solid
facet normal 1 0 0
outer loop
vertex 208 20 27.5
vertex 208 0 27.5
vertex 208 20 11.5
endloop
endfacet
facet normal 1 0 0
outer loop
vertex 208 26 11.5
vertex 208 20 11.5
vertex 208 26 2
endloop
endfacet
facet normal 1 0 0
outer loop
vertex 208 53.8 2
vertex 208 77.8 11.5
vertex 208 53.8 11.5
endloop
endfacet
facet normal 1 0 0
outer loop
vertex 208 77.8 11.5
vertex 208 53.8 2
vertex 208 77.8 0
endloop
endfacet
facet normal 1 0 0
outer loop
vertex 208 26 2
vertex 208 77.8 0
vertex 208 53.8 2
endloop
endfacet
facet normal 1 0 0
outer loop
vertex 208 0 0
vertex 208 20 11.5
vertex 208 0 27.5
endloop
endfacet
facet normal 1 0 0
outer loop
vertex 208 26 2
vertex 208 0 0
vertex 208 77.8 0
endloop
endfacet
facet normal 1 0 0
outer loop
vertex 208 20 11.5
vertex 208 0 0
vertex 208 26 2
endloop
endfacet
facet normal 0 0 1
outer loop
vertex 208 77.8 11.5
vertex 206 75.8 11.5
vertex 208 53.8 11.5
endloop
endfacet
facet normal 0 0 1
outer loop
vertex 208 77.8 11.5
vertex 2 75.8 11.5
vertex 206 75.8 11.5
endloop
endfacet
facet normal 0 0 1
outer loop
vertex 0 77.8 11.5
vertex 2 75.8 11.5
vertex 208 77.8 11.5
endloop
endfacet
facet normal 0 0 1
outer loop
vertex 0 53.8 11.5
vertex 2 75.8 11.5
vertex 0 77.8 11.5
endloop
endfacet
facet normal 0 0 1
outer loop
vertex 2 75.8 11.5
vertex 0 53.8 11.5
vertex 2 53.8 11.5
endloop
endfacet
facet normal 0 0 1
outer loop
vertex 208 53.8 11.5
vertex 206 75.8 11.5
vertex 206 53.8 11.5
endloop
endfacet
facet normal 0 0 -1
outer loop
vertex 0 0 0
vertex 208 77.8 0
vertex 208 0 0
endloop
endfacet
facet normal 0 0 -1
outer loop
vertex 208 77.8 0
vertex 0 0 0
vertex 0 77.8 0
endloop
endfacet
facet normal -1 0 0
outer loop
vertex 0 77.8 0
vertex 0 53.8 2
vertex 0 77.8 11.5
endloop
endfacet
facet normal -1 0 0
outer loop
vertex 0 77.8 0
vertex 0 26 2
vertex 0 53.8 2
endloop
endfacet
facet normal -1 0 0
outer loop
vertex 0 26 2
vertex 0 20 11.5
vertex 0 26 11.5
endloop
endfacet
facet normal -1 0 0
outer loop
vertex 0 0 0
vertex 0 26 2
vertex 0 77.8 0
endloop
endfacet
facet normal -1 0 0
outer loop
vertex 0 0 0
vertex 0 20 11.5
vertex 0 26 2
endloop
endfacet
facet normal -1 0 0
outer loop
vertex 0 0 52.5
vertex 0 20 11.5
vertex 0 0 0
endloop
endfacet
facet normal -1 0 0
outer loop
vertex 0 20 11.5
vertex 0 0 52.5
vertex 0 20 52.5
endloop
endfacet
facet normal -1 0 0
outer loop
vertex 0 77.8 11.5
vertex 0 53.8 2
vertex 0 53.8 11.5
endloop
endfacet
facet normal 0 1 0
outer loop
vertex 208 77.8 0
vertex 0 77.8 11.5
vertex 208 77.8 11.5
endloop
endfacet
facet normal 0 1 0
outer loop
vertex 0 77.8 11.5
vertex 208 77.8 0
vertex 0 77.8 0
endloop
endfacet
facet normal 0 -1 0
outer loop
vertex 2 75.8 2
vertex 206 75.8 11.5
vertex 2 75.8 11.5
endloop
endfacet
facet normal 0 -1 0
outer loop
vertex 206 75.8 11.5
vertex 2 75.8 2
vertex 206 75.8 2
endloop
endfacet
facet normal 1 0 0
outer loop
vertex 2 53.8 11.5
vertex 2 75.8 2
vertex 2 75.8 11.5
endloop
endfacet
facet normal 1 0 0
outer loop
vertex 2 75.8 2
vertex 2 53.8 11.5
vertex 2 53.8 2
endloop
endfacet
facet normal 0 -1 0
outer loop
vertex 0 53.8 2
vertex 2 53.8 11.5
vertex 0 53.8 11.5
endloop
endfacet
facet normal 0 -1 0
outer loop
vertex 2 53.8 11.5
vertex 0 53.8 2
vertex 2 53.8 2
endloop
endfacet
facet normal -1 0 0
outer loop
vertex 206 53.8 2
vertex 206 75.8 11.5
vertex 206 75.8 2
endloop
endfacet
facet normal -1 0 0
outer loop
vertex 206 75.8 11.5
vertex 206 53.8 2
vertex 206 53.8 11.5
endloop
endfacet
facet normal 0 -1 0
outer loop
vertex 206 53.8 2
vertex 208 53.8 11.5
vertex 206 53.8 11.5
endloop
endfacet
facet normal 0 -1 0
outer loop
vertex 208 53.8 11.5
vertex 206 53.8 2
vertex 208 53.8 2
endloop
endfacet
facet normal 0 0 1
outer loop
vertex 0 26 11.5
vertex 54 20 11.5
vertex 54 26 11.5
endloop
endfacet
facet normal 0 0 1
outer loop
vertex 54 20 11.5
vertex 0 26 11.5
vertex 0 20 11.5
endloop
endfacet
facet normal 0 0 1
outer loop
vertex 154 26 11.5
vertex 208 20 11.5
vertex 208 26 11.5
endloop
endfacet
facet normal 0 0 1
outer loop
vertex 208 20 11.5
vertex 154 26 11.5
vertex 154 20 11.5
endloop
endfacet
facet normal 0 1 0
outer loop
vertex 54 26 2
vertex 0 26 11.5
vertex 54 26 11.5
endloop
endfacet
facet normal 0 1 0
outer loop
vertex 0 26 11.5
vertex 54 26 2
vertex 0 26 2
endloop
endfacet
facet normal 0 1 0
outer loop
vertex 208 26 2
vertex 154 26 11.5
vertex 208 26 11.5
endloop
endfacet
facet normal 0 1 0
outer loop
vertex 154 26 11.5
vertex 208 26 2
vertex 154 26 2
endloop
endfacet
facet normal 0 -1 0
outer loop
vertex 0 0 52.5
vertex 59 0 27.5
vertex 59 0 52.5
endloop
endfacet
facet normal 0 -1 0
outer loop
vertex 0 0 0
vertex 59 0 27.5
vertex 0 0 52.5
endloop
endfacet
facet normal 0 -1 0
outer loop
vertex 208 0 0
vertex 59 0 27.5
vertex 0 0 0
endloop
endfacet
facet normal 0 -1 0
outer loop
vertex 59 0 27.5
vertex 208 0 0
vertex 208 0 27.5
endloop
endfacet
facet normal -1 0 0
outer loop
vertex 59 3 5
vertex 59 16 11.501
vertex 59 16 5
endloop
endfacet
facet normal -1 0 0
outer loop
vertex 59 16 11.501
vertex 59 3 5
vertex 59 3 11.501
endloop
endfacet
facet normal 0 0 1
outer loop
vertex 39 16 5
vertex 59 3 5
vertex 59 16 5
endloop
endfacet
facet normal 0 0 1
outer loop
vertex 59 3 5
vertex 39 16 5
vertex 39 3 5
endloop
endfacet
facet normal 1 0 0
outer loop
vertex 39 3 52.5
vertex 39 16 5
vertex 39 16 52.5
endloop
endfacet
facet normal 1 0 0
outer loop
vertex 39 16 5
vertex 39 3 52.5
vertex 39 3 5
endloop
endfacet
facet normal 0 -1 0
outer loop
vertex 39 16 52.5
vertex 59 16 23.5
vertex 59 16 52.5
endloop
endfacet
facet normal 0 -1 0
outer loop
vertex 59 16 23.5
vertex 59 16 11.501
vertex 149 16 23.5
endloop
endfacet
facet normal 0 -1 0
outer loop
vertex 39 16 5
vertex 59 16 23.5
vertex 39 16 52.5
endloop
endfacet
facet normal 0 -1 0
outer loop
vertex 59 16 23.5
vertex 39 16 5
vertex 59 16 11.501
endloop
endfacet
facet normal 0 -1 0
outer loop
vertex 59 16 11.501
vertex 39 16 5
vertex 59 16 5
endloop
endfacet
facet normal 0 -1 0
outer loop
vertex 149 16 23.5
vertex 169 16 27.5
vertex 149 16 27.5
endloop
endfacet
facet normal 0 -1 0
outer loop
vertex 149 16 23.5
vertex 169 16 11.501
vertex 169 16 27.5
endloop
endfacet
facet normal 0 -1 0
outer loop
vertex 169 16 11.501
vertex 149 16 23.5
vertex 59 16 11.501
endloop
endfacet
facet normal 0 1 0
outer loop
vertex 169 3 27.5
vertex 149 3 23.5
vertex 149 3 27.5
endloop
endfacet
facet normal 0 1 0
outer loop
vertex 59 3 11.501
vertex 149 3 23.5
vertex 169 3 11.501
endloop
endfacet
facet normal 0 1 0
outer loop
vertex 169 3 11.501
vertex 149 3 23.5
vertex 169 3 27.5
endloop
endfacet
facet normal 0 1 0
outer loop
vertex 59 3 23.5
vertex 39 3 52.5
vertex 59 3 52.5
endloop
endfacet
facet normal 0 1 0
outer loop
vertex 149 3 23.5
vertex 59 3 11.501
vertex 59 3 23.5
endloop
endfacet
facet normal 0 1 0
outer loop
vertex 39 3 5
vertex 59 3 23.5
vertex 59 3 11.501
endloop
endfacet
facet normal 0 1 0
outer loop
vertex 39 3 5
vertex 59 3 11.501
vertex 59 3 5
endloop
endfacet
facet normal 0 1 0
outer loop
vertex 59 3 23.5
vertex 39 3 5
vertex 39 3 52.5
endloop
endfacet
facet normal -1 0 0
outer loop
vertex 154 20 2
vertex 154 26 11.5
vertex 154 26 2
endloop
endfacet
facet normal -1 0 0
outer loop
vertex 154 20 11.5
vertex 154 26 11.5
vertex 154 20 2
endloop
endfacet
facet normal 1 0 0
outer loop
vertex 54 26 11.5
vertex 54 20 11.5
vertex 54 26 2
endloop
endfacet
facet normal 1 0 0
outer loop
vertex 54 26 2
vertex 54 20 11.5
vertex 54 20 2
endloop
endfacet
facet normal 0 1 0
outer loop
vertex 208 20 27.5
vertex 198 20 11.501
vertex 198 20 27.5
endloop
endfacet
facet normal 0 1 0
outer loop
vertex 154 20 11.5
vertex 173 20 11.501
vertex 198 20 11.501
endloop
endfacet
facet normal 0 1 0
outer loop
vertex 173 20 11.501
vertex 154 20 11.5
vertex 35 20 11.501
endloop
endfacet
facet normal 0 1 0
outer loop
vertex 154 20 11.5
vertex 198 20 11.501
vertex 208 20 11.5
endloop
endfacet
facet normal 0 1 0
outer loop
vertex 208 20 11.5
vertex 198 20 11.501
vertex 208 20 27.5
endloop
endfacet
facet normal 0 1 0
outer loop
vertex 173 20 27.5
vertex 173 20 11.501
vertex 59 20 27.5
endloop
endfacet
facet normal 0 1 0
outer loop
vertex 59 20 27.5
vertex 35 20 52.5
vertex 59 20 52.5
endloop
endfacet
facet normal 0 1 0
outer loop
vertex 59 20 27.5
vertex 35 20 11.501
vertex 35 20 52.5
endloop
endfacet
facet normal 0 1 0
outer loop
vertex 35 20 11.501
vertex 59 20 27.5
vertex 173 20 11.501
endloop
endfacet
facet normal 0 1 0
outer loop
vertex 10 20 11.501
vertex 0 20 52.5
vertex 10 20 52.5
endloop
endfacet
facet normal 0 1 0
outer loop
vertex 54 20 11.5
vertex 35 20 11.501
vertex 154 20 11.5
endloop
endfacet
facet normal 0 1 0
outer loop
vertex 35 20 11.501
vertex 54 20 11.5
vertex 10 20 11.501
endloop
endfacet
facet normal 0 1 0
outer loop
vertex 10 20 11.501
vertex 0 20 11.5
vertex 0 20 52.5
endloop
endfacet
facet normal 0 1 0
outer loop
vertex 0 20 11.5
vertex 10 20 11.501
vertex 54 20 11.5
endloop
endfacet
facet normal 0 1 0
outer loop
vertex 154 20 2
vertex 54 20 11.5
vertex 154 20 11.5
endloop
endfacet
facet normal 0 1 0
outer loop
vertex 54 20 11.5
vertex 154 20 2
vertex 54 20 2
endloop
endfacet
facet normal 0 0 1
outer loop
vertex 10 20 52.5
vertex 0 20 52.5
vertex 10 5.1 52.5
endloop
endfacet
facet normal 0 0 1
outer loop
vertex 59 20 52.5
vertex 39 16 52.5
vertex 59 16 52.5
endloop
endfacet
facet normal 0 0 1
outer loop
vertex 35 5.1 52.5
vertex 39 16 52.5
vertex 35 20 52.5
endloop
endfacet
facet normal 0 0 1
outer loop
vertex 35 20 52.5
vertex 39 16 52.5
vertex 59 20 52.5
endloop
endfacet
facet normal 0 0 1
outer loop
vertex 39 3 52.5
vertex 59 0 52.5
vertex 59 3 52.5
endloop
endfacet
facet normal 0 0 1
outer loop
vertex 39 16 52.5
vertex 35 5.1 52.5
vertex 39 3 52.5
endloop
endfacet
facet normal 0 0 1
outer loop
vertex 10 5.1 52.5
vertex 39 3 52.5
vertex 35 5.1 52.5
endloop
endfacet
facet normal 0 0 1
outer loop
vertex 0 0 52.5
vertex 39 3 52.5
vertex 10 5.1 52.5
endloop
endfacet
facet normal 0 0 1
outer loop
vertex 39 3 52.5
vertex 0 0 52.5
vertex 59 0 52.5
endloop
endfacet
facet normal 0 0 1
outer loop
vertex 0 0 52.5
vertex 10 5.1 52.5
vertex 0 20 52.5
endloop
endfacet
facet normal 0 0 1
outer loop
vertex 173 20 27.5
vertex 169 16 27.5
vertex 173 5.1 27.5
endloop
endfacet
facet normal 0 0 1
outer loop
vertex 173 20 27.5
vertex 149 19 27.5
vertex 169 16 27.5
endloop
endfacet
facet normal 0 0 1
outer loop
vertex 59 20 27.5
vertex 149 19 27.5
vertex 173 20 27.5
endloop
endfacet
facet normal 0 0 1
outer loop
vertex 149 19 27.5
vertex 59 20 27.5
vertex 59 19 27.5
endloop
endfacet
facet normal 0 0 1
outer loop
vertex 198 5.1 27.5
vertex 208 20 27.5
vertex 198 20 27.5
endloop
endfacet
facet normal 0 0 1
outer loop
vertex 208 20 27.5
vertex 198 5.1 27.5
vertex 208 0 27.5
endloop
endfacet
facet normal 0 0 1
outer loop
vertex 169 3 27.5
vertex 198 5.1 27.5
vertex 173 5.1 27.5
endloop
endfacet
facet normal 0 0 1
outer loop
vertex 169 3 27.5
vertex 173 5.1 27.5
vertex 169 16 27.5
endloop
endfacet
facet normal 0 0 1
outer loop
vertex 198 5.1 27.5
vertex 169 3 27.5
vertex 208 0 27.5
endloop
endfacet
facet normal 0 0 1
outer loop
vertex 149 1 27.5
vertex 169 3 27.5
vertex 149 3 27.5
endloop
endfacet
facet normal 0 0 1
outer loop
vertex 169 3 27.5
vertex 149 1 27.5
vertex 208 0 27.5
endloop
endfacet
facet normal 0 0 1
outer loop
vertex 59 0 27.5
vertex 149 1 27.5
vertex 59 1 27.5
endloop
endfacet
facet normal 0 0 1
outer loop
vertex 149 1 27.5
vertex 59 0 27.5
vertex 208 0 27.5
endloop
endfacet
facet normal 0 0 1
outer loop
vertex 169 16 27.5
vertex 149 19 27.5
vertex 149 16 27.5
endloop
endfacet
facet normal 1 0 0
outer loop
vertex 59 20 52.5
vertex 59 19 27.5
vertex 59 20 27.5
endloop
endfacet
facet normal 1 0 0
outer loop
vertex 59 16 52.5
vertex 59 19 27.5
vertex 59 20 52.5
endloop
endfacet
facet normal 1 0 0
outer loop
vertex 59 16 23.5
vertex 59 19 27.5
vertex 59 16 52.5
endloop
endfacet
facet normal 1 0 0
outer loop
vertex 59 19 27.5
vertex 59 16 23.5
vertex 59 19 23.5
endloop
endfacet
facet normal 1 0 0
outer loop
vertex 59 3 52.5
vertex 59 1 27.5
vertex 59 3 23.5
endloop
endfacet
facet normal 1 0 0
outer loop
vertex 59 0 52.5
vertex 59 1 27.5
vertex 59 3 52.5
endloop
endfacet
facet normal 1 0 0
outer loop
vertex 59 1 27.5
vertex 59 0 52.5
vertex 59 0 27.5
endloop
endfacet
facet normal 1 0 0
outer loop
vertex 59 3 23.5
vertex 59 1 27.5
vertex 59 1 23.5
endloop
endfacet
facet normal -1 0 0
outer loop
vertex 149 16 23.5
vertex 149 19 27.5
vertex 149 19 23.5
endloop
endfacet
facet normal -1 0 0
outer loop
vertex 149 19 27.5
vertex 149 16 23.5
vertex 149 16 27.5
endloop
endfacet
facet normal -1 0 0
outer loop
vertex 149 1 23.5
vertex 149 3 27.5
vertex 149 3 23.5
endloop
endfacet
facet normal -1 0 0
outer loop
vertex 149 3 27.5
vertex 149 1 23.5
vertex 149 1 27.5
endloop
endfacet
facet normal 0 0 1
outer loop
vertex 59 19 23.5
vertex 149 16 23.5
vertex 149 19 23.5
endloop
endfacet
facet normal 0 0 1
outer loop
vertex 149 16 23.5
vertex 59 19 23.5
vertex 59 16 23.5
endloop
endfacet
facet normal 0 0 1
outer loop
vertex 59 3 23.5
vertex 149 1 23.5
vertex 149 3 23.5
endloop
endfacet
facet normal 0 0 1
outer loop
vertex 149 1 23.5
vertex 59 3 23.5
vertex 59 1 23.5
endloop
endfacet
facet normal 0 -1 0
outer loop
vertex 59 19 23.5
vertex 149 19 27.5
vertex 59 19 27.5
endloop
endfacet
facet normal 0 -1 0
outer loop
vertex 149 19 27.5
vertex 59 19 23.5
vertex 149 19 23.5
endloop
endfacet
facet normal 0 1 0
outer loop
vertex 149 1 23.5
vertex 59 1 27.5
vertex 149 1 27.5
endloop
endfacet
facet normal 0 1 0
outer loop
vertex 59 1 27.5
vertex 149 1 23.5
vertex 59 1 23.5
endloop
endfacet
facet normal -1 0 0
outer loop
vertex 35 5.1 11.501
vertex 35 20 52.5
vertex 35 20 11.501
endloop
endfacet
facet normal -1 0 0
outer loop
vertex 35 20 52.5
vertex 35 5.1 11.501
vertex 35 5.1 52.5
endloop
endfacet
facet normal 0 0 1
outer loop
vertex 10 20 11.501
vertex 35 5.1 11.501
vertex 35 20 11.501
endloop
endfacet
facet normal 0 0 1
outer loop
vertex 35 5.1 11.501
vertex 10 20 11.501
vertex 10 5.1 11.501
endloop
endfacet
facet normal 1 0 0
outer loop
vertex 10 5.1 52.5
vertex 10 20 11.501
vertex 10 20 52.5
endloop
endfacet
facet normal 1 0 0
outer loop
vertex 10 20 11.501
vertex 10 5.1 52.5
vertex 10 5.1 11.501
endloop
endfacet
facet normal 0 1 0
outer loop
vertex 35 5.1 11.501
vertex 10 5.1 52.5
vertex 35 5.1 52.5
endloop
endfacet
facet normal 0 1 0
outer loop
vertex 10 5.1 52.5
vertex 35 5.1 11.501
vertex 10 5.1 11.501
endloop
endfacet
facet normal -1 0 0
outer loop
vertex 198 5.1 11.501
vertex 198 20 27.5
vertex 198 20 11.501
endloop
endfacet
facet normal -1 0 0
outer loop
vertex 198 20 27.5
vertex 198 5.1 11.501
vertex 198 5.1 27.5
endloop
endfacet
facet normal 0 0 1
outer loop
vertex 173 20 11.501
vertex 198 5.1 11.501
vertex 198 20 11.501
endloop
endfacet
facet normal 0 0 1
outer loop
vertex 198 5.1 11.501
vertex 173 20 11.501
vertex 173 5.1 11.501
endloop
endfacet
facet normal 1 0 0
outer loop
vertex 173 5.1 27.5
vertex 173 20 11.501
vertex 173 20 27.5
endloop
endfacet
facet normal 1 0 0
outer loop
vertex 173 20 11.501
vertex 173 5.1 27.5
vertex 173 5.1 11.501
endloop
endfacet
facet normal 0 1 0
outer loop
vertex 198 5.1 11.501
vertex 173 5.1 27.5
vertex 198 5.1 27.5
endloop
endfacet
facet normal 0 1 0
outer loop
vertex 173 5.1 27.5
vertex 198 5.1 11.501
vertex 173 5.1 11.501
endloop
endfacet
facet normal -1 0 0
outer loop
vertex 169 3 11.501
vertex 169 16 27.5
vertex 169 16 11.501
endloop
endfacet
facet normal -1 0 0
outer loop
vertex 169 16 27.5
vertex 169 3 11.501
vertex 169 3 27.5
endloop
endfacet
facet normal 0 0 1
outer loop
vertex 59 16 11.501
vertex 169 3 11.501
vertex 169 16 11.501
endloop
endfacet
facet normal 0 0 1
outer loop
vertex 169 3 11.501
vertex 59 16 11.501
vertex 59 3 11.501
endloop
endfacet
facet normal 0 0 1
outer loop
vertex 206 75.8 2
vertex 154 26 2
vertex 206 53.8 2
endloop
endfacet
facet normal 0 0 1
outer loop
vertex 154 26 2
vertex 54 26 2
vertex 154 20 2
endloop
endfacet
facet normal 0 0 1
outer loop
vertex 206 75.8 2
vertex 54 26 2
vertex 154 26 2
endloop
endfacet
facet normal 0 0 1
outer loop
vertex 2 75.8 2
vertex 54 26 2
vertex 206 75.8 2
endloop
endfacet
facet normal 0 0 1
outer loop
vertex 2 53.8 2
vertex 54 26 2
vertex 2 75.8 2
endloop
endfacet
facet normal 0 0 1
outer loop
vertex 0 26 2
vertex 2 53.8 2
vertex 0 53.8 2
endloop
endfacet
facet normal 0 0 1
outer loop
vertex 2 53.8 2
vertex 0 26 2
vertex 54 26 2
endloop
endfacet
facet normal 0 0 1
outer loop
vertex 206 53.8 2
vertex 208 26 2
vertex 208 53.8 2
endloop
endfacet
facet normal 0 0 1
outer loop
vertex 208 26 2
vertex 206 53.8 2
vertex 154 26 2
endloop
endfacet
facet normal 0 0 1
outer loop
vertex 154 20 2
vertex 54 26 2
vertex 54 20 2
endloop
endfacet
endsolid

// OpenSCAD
color("purple") cube([208, 77.8, 2]);
color("yellow") {
    translate([0, 75.8, 0]) cube([208, 2, 11.5]);
    translate([0, 53.8, 0]) cube([2, 23, 11.5]);
    translate([206, 53.8, 0]) cube([2, 23, 11.5]);
}

color("green")
translate([0, 0, 1.9999])
    difference() {
        cube([208, 26, 9.5]);
        translate([39, 3, 3]) cube([20, 13, 45]);
        translate([54, 20, -3]) cube([100, 10, 14]);
    }
color("blue")
translate([0, 0, 11.4998])
    difference() {
        cube([208, 20, 41]);
        translate([59, -1, 16]) cube([211, 22, 41]);
        translate([59, 1, 12]) cube([90, 18, 32]);
        translate([10, 5.1, 0.001]) cube([25, 15, 41]);
        translate([173, 5.1, 0.001]) cube([25, 15, 41]);
        translate([39, 3, 0.001]) cube([130, 13, 45]);
        translate([39, 3, -8]) cube([20, 13, 45]);
    };
    
